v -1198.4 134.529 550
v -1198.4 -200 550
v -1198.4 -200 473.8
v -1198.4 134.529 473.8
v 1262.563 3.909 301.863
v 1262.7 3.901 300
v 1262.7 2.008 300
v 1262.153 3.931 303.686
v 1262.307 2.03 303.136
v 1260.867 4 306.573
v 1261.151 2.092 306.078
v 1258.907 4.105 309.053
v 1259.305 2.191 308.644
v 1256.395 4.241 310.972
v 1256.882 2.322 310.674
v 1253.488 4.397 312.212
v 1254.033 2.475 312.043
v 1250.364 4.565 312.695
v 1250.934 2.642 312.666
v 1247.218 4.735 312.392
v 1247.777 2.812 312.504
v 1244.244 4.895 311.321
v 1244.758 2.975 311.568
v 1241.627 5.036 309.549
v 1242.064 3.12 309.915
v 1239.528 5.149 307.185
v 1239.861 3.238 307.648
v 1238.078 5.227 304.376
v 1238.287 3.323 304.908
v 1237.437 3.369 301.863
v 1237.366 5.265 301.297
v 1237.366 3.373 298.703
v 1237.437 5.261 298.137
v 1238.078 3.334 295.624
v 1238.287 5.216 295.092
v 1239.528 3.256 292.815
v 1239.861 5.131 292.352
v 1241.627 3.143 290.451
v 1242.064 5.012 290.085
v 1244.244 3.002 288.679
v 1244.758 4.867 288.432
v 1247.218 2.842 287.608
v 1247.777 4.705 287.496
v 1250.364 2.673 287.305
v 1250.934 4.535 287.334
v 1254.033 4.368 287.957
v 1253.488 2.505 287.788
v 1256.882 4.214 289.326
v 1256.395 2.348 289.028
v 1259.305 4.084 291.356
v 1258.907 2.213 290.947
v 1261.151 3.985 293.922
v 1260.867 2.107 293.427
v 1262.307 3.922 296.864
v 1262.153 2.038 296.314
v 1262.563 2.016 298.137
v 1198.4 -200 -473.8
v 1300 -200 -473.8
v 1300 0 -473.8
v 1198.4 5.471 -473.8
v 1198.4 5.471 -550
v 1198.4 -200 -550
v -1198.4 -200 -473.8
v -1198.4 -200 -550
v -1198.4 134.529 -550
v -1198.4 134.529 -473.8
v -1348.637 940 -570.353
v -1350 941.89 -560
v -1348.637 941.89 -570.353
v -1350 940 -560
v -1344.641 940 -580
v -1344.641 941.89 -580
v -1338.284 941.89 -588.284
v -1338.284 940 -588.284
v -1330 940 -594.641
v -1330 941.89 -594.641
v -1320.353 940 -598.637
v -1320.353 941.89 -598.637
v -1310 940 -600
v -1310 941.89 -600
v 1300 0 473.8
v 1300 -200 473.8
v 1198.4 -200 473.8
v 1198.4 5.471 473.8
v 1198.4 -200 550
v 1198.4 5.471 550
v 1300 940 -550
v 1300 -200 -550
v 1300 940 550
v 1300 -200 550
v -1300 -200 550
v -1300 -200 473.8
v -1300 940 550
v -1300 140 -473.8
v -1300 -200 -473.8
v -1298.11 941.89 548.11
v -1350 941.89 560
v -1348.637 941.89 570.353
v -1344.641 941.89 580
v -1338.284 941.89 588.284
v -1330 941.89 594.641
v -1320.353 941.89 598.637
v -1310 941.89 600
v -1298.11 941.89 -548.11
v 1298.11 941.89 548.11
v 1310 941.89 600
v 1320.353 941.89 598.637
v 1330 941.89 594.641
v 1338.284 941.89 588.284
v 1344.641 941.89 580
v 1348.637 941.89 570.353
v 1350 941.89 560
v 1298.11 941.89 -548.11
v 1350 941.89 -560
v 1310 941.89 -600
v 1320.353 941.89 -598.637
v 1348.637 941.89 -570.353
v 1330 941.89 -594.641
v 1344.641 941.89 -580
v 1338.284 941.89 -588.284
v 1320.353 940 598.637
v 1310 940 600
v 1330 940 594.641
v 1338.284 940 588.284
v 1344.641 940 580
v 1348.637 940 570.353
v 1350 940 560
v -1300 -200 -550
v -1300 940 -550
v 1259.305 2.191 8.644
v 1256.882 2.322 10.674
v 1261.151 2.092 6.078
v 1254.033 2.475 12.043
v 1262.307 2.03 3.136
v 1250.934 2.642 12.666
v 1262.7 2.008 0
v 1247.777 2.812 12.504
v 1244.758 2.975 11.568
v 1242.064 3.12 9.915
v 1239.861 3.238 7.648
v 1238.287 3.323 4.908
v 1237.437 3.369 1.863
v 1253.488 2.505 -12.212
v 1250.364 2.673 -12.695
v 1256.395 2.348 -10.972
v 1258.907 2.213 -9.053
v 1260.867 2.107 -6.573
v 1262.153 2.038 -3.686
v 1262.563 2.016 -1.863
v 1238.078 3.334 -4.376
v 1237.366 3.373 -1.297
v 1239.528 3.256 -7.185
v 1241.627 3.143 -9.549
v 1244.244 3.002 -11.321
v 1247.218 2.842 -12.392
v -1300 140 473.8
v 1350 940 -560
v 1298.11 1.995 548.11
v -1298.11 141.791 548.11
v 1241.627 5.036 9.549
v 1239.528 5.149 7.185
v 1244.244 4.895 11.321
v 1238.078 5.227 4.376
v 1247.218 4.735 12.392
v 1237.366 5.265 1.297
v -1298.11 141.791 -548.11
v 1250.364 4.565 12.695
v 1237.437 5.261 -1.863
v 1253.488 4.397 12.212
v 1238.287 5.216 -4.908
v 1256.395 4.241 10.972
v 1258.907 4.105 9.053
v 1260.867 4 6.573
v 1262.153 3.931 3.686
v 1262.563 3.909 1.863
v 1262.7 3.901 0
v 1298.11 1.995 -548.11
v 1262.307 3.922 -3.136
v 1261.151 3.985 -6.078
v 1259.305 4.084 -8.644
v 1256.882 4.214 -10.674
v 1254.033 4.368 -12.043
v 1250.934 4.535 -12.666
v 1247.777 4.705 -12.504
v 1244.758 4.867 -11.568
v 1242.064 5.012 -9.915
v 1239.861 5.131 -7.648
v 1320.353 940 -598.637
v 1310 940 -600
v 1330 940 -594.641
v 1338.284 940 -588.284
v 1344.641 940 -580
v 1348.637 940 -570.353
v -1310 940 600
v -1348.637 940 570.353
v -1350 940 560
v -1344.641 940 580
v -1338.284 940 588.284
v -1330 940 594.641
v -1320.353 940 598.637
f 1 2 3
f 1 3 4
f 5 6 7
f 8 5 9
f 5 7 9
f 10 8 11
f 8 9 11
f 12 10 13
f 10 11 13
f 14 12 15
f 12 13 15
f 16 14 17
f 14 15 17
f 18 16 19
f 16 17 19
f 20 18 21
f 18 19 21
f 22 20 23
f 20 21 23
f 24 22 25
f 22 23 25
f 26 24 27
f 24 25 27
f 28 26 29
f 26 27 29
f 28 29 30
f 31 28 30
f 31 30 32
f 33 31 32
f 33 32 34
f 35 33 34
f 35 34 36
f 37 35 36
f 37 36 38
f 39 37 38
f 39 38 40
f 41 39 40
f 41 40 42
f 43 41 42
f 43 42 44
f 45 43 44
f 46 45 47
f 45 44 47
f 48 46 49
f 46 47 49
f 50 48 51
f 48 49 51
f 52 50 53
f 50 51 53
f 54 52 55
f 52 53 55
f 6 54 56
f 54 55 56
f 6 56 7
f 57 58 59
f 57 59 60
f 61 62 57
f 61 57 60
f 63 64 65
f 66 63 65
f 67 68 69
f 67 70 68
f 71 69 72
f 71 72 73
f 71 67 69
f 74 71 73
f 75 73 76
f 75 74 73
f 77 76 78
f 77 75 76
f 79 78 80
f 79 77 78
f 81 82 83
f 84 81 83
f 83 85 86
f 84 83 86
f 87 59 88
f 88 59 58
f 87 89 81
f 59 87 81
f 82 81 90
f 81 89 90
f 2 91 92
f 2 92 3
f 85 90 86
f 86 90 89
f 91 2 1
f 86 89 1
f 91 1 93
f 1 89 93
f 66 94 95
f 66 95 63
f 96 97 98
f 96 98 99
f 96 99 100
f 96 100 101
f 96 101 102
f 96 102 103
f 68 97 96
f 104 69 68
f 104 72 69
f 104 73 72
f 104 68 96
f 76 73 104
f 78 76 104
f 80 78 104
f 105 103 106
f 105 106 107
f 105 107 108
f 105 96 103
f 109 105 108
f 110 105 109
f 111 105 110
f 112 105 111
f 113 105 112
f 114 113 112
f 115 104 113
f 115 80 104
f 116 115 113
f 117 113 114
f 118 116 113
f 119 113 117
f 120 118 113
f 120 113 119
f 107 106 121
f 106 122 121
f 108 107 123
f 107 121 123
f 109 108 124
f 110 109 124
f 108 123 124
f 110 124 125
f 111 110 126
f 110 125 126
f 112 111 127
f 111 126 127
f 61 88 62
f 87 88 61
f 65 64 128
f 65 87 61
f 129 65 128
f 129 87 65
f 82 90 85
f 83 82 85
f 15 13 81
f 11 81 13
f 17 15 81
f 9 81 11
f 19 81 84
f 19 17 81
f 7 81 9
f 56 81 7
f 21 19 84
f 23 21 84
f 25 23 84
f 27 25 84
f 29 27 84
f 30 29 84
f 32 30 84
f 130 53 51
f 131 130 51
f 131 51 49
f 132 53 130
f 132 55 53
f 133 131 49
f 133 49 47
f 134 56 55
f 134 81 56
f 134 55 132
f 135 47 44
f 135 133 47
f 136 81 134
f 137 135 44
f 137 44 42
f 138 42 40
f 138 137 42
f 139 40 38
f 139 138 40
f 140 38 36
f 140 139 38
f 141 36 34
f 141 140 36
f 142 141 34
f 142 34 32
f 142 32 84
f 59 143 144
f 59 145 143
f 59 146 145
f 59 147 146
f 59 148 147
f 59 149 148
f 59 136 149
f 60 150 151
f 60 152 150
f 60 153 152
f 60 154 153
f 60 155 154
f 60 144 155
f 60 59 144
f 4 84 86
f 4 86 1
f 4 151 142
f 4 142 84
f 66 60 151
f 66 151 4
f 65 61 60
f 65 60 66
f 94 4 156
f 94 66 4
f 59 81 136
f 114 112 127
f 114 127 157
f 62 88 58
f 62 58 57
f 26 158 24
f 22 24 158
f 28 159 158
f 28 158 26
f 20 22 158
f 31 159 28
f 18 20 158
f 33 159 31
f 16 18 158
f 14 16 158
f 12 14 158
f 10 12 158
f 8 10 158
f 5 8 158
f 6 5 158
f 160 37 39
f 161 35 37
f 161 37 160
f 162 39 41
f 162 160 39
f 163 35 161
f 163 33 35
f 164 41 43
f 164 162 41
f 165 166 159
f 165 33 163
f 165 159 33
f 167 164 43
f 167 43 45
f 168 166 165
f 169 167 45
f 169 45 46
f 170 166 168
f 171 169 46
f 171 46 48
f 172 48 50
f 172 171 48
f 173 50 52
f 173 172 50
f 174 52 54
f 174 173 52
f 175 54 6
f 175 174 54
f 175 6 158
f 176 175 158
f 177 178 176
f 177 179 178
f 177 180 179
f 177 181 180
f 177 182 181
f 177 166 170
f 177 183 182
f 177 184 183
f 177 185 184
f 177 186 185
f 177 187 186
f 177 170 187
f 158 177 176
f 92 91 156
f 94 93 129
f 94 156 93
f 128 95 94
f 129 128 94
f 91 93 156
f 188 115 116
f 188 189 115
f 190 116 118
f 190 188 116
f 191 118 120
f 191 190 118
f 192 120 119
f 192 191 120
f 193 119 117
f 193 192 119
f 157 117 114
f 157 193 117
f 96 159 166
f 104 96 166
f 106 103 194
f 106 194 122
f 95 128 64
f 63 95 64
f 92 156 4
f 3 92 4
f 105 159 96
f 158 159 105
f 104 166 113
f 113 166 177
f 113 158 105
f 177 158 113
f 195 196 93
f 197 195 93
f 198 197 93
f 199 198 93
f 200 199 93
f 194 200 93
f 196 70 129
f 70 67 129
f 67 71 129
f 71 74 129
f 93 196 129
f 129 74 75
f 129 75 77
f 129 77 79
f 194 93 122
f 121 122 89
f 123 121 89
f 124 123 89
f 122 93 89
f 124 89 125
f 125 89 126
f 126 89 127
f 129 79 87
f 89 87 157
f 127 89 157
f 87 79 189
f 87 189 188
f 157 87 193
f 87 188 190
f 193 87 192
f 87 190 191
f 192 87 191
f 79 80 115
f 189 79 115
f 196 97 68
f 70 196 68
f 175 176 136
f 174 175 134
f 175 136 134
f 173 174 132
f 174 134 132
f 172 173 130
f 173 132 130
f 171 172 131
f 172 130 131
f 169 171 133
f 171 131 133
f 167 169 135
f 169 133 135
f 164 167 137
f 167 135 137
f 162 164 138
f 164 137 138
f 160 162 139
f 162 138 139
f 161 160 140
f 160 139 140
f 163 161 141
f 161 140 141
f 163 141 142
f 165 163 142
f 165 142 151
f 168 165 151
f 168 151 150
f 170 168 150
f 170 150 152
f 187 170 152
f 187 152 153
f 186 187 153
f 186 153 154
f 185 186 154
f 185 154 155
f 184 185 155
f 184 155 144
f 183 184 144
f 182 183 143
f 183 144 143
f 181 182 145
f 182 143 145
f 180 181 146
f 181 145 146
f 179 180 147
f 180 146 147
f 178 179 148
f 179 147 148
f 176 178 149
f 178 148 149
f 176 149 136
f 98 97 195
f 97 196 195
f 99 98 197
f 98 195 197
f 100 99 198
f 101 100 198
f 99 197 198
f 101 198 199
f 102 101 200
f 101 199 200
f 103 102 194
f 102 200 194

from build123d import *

# Parameters (mm, degrees)
CROQUIS2_W              = 2600
CROQUIS2_H              = 1100
SALIENTE_EXTRUIR1_DEPTH = 1.89
CROQUIS3_W              = 2600
CROQUIS3_H              = 1100
CROQUIS3_W_2            = 2596.22
CROQUIS3_H_2            = 1096.22
SALIENTE_EXTRUIR2_DEPTH = 940
CROQUIS4_W              = 2700
CROQUIS4_H              = 1200
CROQUIS4_W_2            = 2600
CROQUIS4_H_2            = 1100
SALIENTE_EXTRUIR3_DEPTH = 1.89
REDONDEO1_R             = 40
CORTAR_EXTRUIR2_REACH   = 2010.023
SALIENTE_EXTRUIR4_DEPTH = 1100
SALIENTE_EXTRUIR5_DEPTH = 76.2
SALIENTE_EXTRUIR6_DEPTH = 76.2
CROQUIS10_R             = 12.7
CORTAR_EXTRUIR3_DEPTH   = 280


with BuildPart() as part:
    # Croquis2 → Saliente-Extruir1 (new body)
    with BuildSketch(Plane(origin=(0, 0, 0), x_dir=(1, 0, 0), z_dir=(0, 1, 0))):
        Rectangle(CROQUIS2_W, CROQUIS2_H)
    extrude(amount=SALIENTE_EXTRUIR1_DEPTH)

    # Croquis3 → Saliente-Extruir2 (add)
    with BuildSketch(Plane(origin=(0, 1.89, 0), x_dir=(1, 0, 0), z_dir=(0, 1, 0))):
        Rectangle(CROQUIS3_W, CROQUIS3_H)
        Rectangle(CROQUIS3_W_2, CROQUIS3_H_2, mode=Mode.SUBTRACT)
    extrude(amount=SALIENTE_EXTRUIR2_DEPTH)

    # Croquis4 → Saliente-Extruir3 (add)
    with BuildSketch(Plane(origin=(0, 941.89, 0), x_dir=(1, 0, 0), z_dir=(0, 1, 0))):
        Rectangle(CROQUIS4_W, CROQUIS4_H)
        Rectangle(CROQUIS4_W_2, CROQUIS4_H_2, mode=Mode.SUBTRACT)
    extrude(amount=-SALIENTE_EXTRUIR3_DEPTH)

    # Redondeo1
    redondeo1_edges = [part.edges().sort_by_distance(p)[0] for p in [
        (-1350, 940.945, -600),
        (1350, 940.945, -600),
        (1350, 940.945, 600),
        (-1350, 940.945, 600),
    ]]
    fillet(redondeo1_edges, radius=REDONDEO1_R)

    # Cortar-Extruir2: up to this face of the body (flat: up to its plane)
    cortar_extruir2_end = Plane(part.part.faces().sort_by_distance((0, 470, 550))[0])
    # Croquis6 → Cortar-Extruir2 (cut, up to the picked face)
    with BuildSketch(Plane(origin=(0, 0, -550), x_dir=(-1, 0, 0), z_dir=(0, 0, -1)), mode=Mode.PRIVATE) as cortar_extruir2_sk1:
        Polygon((-1300, 0), (1300, 140), (1300, 0), align=None)
    cortar_extruir2_tool1 = split(extrude(cortar_extruir2_sk1.sketch, amount=-CORTAR_EXTRUIR2_REACH, mode=Mode.PRIVATE), bisect_by=cortar_extruir2_end, keep=Keep.BOTH, mode=Mode.PRIVATE)
    add(cortar_extruir2_tool1.solids().sort_by(Axis((-433.333333, 46.666667, -550), (0, 0, 1)))[0], mode=Mode.SUBTRACT)

    # Croquis7 → Saliente-Extruir4 (add)
    with BuildSketch(Plane(origin=(0, 0, -550), x_dir=(-1, 0, 0), z_dir=(0, 0, -1))):
        Polygon((-1300, 0), (1300, 140), (1300, 141.892737958), (-1300, 1.892737958), align=None)
    extrude(amount=-SALIENTE_EXTRUIR4_DEPTH)

    # Croquis8 → Saliente-Extruir5 (add)
    with BuildSketch(Plane(origin=(0, 0, -550), x_dir=(-1, 0, 0), z_dir=(0, 0, -1))):
        Polygon((-1300, 0), (-1300, -200), (-1198.4, -200), (-1198.4, 5.470769231), align=None)
        Polygon((1300, 140), (1300, -200), (1198.4, -200), (1198.4, 134.529230769), align=None)
    extrude(amount=-SALIENTE_EXTRUIR5_DEPTH)

    # Croquis9 → Saliente-Extruir6 (add)
    with BuildSketch(Plane.XY.offset(550)):
        Polygon((1300, 0), (1300, -200), (1198.4, -200), (1198.4, 5.470769231), align=None)
        Polygon((-1300, 140), (-1300, -200), (-1198.4, -200), (-1198.4, 134.529230769), align=None)
    extrude(amount=-SALIENTE_EXTRUIR6_DEPTH)

    # Croquis10 → Cortar-Extruir3 (cut)
    with BuildSketch(Plane.XZ.offset(200)):
        with Locations((1250, 0)):
            Circle(CROQUIS10_R)
        with Locations((1250, 300)):
            Circle(CROQUIS10_R)
    extrude(amount=-CORTAR_EXTRUIR3_DEPTH, mode=Mode.SUBTRACT)


solid = part.part
